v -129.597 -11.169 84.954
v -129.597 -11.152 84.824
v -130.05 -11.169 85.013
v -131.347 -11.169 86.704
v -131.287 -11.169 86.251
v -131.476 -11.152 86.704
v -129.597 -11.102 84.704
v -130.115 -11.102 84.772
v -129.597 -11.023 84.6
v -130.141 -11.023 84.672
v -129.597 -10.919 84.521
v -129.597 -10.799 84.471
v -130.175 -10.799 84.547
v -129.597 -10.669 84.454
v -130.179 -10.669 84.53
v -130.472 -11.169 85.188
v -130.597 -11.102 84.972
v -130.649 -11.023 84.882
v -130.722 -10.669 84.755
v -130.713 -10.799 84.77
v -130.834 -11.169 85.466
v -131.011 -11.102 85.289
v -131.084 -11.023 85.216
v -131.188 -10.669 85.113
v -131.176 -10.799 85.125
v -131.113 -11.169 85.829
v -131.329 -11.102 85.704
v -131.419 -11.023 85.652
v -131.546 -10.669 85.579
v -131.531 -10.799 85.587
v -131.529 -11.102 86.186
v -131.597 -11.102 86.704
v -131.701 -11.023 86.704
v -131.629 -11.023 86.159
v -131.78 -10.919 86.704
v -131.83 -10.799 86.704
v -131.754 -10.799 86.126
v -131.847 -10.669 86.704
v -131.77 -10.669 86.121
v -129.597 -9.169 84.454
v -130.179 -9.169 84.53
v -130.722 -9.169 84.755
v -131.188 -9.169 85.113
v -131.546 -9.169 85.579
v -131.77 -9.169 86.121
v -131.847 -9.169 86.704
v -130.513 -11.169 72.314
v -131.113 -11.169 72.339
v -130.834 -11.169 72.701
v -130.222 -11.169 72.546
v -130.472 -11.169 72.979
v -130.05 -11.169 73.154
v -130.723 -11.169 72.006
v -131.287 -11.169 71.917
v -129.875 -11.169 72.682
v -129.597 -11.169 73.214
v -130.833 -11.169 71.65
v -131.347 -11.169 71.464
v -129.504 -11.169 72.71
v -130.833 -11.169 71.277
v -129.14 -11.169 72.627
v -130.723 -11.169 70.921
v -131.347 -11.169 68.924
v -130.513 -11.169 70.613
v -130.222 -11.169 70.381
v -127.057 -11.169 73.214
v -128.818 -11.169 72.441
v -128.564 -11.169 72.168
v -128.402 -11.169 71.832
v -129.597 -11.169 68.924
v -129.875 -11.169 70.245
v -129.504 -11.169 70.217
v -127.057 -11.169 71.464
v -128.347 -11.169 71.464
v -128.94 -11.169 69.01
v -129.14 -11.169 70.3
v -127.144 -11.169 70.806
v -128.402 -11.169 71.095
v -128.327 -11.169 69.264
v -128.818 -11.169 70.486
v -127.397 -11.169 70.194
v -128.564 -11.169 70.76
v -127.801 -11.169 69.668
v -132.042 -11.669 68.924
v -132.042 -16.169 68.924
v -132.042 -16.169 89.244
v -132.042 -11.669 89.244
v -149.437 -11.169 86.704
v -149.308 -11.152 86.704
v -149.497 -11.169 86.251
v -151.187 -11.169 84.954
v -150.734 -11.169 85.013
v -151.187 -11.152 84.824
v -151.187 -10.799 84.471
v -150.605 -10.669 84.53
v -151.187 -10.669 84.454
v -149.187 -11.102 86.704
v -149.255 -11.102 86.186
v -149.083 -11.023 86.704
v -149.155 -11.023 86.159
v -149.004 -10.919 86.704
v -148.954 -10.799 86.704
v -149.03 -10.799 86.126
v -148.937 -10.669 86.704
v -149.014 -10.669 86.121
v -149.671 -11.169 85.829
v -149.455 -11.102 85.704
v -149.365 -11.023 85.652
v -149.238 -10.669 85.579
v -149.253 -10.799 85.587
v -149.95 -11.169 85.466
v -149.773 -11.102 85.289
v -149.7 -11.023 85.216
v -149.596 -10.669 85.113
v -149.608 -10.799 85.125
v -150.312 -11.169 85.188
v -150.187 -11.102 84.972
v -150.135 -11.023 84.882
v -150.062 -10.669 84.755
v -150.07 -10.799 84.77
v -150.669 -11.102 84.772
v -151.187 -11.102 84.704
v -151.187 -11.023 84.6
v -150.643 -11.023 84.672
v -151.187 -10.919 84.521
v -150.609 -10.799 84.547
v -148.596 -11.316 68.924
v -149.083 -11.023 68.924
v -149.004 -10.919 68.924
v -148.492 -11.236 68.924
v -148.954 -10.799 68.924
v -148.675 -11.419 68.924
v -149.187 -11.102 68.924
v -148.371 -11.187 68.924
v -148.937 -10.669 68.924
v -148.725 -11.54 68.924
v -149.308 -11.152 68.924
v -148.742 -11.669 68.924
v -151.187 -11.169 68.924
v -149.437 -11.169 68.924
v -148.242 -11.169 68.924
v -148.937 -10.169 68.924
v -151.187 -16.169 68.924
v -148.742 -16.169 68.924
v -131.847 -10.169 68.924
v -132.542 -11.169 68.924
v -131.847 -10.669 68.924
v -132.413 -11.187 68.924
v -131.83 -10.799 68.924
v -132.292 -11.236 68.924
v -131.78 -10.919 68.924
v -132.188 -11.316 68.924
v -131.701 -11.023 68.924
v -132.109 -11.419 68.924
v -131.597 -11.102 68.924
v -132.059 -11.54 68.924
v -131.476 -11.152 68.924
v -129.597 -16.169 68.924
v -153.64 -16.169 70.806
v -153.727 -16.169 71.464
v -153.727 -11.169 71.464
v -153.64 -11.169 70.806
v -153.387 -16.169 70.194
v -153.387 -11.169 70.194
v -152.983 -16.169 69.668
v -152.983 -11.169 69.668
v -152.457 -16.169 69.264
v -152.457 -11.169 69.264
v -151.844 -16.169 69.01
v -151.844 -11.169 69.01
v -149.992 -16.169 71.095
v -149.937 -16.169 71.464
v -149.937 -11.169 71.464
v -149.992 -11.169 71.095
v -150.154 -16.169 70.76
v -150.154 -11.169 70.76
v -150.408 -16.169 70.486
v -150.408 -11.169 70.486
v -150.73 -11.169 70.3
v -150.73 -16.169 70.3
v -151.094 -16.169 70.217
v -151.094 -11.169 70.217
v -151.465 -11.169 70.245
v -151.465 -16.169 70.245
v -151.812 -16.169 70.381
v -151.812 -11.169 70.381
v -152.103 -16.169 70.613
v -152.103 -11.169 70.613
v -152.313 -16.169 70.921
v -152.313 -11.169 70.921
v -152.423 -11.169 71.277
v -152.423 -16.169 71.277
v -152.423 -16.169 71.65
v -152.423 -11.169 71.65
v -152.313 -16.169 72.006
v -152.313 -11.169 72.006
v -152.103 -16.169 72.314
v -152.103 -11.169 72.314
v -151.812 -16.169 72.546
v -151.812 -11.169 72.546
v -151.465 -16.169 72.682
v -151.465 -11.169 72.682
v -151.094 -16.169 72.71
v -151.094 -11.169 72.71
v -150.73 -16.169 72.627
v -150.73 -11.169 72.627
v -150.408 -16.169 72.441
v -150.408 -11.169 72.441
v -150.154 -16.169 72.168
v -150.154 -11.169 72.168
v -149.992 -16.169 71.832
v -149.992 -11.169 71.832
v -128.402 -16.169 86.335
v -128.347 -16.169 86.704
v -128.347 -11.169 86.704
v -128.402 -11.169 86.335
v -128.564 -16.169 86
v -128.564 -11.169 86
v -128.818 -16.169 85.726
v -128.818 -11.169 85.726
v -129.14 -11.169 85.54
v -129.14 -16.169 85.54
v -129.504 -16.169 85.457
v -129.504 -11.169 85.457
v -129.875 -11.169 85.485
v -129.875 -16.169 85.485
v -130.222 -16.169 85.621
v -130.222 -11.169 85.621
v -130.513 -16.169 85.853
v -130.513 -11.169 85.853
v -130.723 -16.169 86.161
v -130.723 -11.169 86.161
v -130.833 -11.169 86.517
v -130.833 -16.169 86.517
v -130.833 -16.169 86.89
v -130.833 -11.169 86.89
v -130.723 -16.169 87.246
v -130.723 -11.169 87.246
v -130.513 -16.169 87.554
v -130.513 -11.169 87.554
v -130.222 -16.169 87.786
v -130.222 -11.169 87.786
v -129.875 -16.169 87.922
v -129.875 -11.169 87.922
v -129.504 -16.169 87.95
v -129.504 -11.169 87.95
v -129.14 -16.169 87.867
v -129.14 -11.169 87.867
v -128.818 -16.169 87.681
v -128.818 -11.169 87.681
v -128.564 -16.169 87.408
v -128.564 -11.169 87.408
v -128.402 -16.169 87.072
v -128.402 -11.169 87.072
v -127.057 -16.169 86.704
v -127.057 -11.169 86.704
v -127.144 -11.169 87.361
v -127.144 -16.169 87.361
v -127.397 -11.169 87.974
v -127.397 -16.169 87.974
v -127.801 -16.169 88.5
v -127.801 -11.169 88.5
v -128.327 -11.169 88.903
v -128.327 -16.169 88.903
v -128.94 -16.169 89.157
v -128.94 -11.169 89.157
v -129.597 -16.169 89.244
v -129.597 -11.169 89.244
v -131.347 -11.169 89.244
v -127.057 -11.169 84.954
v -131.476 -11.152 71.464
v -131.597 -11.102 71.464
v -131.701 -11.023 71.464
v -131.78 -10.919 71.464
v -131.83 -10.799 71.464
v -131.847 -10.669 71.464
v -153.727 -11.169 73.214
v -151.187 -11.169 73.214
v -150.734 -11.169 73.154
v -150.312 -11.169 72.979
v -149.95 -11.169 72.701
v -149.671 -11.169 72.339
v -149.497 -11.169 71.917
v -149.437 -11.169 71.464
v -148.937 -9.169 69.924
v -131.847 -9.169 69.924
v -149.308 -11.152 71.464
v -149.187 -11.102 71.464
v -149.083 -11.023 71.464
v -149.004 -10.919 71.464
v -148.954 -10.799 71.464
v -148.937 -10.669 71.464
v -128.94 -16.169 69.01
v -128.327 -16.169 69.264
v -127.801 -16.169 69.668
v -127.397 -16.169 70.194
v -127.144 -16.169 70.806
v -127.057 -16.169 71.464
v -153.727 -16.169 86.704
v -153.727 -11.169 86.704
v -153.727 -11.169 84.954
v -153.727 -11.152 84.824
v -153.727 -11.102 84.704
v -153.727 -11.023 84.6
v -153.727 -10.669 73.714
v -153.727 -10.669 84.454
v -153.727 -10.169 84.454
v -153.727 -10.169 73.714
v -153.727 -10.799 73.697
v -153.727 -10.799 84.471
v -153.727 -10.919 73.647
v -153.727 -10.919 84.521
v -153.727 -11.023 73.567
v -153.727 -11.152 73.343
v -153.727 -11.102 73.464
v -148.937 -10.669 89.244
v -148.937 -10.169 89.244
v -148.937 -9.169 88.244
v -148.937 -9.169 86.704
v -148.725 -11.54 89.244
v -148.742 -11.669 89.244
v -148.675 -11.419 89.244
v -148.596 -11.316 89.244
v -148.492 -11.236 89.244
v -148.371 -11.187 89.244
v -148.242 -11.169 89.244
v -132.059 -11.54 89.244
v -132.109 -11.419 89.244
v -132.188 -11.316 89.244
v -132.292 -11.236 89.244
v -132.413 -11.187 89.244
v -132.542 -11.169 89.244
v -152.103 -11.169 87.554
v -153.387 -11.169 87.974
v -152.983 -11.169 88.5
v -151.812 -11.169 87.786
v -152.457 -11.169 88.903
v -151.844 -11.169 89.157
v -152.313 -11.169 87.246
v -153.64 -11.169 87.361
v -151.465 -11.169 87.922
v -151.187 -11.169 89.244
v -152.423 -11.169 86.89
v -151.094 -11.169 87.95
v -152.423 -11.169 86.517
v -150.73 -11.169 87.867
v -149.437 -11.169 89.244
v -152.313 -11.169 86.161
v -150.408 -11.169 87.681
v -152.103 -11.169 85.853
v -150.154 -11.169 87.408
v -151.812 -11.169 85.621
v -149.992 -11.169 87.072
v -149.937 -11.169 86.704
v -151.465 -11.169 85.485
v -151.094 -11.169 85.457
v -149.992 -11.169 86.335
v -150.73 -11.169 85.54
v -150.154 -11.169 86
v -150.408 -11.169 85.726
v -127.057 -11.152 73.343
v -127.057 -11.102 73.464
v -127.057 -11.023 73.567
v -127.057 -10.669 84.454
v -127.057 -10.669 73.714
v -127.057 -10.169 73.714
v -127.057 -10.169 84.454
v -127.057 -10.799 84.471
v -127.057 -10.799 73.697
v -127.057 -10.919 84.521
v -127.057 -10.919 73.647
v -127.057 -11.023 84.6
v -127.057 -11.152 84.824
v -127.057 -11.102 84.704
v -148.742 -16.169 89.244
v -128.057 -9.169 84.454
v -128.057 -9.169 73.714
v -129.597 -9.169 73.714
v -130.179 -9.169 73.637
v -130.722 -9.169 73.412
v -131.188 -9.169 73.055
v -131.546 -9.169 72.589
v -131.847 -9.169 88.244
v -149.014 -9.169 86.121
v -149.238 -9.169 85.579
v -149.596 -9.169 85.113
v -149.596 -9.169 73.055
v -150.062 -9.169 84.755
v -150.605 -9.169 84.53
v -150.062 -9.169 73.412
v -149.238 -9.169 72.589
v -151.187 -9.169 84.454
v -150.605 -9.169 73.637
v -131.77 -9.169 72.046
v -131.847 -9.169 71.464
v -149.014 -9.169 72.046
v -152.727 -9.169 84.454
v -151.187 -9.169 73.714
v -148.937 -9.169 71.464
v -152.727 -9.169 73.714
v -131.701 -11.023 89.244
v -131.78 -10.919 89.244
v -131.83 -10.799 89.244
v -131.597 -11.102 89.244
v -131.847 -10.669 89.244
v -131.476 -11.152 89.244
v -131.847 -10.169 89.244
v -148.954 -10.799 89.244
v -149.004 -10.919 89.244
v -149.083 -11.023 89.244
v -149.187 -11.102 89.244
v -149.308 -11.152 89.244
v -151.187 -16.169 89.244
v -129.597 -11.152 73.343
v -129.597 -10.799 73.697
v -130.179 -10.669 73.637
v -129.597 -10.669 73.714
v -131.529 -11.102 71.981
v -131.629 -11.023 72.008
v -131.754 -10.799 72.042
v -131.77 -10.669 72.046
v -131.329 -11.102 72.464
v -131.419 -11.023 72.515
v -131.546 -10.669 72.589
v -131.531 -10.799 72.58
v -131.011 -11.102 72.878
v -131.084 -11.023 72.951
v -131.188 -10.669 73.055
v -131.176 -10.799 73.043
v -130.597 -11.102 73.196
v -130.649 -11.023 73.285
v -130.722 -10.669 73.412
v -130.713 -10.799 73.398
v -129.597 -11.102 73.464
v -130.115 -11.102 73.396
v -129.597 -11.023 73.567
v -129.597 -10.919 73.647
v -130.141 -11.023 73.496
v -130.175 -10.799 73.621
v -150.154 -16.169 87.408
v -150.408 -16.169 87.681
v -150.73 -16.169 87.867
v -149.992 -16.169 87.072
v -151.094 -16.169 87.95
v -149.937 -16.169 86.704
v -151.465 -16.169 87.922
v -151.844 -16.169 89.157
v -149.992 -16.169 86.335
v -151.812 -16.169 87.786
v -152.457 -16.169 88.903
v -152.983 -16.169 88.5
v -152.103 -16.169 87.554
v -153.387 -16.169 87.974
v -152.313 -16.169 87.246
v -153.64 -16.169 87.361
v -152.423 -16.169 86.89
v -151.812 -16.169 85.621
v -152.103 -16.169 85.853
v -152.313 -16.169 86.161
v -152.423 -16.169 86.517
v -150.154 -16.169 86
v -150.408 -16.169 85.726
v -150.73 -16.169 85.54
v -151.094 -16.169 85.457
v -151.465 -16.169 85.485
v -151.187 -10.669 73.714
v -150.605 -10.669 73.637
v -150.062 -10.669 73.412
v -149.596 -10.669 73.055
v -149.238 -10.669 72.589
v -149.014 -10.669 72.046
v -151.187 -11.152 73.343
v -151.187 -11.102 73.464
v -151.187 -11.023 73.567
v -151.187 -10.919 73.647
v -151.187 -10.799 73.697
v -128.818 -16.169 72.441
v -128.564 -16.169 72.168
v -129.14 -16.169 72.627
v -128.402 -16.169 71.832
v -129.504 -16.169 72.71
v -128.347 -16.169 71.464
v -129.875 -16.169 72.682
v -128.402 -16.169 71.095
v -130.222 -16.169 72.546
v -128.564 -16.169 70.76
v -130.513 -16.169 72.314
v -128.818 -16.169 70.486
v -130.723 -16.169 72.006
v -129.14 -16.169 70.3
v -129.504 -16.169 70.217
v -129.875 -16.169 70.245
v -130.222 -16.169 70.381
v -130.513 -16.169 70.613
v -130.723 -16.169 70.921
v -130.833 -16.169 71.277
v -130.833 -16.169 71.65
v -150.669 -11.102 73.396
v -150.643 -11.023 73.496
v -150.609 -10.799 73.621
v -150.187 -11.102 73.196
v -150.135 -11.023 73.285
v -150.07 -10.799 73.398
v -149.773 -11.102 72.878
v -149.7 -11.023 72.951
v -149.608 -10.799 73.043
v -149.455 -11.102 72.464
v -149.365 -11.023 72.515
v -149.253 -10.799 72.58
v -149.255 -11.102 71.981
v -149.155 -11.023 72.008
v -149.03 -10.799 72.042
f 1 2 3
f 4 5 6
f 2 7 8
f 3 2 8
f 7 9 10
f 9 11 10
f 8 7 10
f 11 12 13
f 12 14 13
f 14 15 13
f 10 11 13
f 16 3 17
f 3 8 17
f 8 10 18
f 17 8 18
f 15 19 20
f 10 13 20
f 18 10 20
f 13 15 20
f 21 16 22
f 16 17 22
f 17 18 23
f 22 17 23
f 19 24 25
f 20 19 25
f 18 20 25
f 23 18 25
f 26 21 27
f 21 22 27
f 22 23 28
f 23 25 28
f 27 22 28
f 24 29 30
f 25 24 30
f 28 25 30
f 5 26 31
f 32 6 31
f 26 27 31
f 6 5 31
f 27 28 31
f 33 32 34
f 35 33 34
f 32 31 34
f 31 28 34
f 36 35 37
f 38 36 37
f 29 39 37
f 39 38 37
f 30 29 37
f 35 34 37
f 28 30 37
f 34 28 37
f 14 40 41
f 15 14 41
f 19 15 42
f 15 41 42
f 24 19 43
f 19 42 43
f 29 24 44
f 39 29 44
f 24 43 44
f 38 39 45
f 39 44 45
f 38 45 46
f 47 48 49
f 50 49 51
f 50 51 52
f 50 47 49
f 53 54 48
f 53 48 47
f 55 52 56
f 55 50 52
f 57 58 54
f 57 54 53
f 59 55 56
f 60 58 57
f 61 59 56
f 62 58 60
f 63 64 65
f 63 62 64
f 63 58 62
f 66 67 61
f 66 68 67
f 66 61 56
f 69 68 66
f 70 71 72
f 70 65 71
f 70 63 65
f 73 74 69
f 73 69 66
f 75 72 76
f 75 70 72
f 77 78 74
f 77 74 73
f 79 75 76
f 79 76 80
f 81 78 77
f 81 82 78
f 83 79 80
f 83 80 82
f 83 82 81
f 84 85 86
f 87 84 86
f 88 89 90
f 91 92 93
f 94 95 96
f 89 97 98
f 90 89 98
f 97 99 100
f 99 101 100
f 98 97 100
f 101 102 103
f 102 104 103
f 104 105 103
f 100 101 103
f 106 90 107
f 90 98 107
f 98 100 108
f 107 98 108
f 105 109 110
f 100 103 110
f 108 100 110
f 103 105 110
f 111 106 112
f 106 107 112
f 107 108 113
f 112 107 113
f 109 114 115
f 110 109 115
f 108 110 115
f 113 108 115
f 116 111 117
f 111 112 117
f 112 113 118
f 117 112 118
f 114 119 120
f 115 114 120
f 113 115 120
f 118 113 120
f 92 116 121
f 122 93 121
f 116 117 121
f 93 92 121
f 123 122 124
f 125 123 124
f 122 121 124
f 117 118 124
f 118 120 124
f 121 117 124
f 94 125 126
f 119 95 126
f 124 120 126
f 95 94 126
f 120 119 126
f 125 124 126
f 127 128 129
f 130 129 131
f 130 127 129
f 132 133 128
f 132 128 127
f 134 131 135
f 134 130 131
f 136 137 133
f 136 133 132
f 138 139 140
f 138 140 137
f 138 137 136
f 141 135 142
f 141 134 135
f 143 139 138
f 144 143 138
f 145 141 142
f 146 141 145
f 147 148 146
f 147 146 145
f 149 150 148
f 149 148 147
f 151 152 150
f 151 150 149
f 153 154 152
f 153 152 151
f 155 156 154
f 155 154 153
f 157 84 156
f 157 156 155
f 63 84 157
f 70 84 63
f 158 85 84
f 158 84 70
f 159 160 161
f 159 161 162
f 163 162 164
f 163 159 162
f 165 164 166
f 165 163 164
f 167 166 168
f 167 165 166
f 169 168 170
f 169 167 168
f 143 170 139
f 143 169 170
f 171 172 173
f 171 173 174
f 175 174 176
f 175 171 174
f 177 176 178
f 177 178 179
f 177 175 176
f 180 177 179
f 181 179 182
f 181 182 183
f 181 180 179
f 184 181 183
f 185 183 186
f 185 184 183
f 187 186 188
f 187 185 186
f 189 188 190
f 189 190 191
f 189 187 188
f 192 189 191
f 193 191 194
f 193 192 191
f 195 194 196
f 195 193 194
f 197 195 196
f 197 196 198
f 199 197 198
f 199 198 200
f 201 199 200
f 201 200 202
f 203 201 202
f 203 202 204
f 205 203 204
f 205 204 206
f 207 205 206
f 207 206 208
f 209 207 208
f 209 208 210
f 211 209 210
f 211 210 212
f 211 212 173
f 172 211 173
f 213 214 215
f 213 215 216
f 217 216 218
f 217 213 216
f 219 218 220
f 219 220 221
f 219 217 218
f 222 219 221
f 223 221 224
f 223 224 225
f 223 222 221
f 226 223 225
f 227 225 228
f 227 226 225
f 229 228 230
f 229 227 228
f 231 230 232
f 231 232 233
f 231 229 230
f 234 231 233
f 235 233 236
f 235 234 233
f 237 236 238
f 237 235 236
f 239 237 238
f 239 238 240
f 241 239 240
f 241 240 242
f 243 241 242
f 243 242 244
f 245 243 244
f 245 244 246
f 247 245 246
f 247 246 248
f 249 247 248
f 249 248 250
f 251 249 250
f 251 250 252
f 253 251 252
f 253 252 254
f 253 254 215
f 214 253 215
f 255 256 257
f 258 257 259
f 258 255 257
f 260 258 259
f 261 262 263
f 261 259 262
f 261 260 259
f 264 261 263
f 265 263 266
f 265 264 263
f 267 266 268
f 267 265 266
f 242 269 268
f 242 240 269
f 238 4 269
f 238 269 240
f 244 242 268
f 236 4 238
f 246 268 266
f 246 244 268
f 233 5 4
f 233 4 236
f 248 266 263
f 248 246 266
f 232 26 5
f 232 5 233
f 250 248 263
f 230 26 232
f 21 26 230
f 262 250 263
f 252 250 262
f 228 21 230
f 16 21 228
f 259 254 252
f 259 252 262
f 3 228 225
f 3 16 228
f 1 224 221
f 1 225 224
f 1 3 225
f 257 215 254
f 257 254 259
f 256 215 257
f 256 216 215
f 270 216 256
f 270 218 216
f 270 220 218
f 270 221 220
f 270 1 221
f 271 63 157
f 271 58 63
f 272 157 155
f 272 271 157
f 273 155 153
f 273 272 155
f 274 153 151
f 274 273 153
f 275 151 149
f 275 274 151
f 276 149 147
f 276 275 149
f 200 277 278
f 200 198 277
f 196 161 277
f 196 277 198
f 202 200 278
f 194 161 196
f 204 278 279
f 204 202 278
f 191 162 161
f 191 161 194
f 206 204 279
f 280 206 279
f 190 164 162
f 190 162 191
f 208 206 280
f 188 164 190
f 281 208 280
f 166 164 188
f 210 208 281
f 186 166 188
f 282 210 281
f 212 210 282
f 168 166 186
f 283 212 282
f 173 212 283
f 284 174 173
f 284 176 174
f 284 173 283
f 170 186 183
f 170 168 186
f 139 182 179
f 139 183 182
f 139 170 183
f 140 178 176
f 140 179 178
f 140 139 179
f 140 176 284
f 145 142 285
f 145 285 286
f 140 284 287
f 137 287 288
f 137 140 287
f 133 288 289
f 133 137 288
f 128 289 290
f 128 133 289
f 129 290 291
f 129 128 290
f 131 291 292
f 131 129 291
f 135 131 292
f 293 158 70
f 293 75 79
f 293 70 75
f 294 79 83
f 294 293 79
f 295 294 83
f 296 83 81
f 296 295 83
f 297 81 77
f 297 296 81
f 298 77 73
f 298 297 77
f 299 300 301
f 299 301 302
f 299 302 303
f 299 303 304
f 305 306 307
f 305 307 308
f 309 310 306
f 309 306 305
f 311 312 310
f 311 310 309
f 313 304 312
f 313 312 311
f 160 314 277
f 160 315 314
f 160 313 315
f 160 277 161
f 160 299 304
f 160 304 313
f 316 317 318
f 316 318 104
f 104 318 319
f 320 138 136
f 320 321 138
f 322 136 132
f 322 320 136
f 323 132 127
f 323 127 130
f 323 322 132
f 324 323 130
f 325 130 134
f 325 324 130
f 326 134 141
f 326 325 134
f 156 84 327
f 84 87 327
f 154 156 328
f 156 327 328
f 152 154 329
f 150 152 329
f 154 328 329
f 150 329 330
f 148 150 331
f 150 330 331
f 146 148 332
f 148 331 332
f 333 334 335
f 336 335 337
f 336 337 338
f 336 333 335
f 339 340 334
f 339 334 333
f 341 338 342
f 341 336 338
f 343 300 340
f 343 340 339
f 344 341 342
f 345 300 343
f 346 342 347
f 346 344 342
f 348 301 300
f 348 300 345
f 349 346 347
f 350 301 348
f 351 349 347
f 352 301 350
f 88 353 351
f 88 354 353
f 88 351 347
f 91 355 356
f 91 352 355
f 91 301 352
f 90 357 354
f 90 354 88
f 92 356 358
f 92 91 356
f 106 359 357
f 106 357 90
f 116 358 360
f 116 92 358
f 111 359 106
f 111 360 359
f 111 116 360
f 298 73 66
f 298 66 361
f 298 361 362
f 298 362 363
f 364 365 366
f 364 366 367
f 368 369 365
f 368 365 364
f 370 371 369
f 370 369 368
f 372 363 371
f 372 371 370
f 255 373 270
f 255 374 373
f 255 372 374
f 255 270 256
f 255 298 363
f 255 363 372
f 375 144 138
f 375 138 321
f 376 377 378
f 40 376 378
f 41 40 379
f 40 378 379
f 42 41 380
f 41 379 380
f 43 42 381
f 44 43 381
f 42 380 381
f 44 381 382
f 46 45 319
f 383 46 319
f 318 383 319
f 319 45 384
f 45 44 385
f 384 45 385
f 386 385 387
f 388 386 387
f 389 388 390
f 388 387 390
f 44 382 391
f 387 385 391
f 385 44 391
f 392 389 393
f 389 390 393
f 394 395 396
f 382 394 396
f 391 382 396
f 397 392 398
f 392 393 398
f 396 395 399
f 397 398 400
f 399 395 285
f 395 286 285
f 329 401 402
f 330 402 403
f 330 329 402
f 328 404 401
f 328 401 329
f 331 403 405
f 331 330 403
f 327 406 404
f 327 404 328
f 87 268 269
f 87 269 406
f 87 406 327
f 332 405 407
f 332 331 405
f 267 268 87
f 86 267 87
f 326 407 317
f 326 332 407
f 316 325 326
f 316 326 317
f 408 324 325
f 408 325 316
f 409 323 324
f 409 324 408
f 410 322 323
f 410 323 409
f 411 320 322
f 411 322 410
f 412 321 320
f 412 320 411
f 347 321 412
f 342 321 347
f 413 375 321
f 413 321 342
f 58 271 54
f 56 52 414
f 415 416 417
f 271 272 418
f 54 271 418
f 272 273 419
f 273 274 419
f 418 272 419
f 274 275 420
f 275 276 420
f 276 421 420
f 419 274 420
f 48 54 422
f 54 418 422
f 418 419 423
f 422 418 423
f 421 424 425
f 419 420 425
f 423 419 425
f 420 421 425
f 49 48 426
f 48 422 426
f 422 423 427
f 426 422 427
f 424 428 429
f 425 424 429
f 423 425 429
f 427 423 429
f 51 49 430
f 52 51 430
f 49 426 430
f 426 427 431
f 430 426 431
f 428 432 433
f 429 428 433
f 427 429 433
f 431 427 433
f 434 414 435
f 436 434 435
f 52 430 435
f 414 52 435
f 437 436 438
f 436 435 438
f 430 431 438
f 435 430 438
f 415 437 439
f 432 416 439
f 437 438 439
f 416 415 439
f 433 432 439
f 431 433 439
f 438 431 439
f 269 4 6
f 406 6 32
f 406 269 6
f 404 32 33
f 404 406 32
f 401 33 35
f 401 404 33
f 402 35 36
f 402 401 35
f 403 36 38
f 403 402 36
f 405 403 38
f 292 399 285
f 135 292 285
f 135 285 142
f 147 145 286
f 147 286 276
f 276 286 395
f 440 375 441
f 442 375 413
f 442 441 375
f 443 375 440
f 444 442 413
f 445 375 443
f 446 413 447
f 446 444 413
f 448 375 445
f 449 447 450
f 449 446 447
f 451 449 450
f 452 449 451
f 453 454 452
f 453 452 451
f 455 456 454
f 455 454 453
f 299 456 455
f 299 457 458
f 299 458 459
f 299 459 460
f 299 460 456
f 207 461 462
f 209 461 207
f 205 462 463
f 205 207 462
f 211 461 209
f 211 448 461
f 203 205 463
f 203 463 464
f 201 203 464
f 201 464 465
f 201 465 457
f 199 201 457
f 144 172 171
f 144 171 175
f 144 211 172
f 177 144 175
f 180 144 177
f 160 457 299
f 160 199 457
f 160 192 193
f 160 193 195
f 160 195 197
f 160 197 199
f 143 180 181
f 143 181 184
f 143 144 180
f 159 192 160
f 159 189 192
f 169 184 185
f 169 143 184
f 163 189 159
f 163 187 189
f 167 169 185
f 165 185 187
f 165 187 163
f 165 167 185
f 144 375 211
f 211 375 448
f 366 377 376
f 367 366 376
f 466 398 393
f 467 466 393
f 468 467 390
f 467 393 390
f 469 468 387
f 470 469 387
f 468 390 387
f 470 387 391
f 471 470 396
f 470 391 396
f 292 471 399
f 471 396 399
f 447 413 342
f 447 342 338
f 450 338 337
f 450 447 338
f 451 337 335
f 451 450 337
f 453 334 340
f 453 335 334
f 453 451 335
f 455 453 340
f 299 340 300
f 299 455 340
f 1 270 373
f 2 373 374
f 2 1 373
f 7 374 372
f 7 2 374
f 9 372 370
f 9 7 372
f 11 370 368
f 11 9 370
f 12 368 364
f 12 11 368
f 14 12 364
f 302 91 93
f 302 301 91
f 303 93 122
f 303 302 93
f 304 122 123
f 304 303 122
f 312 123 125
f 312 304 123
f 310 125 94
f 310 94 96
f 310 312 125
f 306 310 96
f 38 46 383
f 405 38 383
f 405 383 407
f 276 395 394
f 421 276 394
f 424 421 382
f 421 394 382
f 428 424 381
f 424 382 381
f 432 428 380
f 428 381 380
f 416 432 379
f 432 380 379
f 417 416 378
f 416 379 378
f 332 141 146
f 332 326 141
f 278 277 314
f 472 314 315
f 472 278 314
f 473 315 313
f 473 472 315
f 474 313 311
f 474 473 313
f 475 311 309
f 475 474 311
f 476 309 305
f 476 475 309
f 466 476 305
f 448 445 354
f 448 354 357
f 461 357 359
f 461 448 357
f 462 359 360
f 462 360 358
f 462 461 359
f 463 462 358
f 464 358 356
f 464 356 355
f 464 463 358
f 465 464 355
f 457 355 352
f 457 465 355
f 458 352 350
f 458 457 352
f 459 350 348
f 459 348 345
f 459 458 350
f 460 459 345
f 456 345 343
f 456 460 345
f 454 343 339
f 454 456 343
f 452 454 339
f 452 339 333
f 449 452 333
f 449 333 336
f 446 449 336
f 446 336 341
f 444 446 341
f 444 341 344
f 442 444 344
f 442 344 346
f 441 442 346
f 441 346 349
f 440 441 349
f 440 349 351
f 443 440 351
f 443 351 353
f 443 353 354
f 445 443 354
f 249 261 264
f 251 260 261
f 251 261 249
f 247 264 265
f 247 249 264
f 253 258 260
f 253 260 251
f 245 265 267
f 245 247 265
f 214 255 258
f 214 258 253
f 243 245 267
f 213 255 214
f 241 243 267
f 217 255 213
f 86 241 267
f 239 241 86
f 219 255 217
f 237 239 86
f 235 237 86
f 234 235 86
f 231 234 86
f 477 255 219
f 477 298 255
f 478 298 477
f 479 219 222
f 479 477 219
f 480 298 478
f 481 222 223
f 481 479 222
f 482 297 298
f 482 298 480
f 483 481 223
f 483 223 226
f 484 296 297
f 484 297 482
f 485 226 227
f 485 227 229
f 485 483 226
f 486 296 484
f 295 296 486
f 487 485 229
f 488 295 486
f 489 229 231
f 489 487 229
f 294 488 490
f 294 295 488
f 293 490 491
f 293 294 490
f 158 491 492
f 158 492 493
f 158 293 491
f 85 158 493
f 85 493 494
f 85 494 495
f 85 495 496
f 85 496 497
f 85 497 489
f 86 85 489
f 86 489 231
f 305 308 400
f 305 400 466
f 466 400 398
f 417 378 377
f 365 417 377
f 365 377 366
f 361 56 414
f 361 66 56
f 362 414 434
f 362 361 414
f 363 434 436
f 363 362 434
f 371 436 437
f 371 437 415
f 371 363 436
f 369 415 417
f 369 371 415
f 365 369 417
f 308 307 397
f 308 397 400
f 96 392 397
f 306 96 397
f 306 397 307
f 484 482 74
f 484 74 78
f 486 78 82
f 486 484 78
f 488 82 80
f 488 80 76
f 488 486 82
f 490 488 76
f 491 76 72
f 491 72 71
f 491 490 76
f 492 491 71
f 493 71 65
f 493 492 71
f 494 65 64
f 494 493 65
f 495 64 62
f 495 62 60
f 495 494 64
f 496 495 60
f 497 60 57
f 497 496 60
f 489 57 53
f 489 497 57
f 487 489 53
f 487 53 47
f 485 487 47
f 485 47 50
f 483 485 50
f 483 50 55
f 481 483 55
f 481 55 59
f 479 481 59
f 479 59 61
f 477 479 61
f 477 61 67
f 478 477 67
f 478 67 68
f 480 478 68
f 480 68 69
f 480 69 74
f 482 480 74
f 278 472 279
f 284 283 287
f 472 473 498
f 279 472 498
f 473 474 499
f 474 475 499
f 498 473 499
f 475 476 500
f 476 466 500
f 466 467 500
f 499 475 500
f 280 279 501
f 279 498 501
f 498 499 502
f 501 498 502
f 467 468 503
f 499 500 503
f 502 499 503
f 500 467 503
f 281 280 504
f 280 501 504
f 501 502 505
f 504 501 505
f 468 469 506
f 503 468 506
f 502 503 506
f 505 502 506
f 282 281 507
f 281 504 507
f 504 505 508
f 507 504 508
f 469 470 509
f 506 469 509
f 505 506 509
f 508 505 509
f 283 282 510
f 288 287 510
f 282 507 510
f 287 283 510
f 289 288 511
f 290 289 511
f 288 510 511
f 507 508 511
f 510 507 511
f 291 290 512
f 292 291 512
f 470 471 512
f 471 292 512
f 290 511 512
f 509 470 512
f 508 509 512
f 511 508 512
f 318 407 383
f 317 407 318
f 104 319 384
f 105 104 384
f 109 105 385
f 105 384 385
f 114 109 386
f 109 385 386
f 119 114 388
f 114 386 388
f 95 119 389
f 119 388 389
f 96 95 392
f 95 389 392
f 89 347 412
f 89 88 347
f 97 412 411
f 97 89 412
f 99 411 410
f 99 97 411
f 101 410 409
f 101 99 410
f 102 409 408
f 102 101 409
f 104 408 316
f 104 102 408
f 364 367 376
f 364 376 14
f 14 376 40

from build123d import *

# Parameters (mm, degrees)
SKETCH1_R           = 1.25
BOSS_EXTRUDE1_DEPTH = 7
SKETCH2_W           = 16.7
SKETCH2_H           = 20.32
CUT_EXTRUDE1_DEPTH  = 5
SKETCH3_R           = 1.25
CUT_EXTRUDE2_DEPTH  = 2
CHAMFER1_SIZE       = 1
FILLET1_R           = 0.5
FILLET2_R           = 0.5


with BuildPart() as part:
    # Sketch1 → Boss-Extrude1 (new body)
    with BuildSketch(Plane(origin=(0, -16.169464744, 0), x_dir=(1, 0, 0), z_dir=(0, 1, 0))):
        with BuildLine():
            Line((-127.05696299, -71.463712198), (-127.05696299, -86.703712198))
            ThreePointArc((-127.05696299, -86.703712198), (-127.800911766, -88.499763423), (-129.59696299, -89.243712198))
            Line((-129.59696299, -89.243712198), (-151.18696299, -89.243712198))
            ThreePointArc((-151.18696299, -89.243712198), (-152.983014214, -88.499763423), (-153.72696299, -86.703712198))
            Line((-153.72696299, -86.703712198), (-153.72696299, -71.463712198))
            ThreePointArc((-153.72696299, -71.463712198), (-152.983014214, -69.667660974), (-151.18696299, -68.923712198))
            Line((-151.18696299, -68.923712198), (-129.59696299, -68.923712198))
            ThreePointArc((-129.59696299, -68.923712198), (-127.800911766, -69.667660974), (-127.05696299, -71.463712198))
        make_face()
        with Locations((-151.18696299, -71.463712198)):
            Circle(SKETCH1_R, mode=Mode.SUBTRACT)
        with Locations((-151.18696299, -86.703712198)):
            Circle(SKETCH1_R, mode=Mode.SUBTRACT)
        with Locations((-129.59696299, -86.703712198)):
            Circle(SKETCH1_R, mode=Mode.SUBTRACT)
        with Locations((-129.59696299, -71.463712198)):
            Circle(SKETCH1_R, mode=Mode.SUBTRACT)
    extrude(amount=BOSS_EXTRUDE1_DEPTH)

    # Sketch2 → Cut-Extrude1 (cut)
    with BuildSketch(Plane.XZ.offset(16.169464744)):
        with Locations((-140.39196299, 79.083712198)):
            Rectangle(SKETCH2_W, SKETCH2_H)
    extrude(amount=-CUT_EXTRUDE1_DEPTH, mode=Mode.SUBTRACT)

    # Sketch3 → Cut-Extrude2 (cut)
    with BuildSketch(Plane(origin=(0, -9.169464744, 0), x_dir=(1, 0, 0), z_dir=(0, 1, 0))):
        with BuildLine():
            Line((-131.84696299, -86.703712198), (-131.84696299, -89.243712198))
            Line((-131.84696299, -89.243712198), (-129.59696299, -89.243712198))
            ThreePointArc((-129.59696299, -89.243712198), (-127.800911766, -88.499763423), (-127.05696299, -86.703712198))
            Line((-127.05696299, -86.703712198), (-127.05696299, -84.453712198))
            Line((-127.05696299, -84.453712198), (-129.59696299, -84.453712198))
            ThreePointArc((-129.59696299, -84.453712198), (-131.187953248, -85.112721941), (-131.84696299, -86.703712198))
        make_face()
        with Locations((-129.59696299, -86.703712198)):
            Circle(SKETCH3_R, mode=Mode.SUBTRACT)
        with BuildLine():
            Line((-151.18696299, -89.243712198), (-148.93696299, -89.243712198))
            Line((-148.93696299, -89.243712198), (-148.93696299, -86.703712198))
            ThreePointArc((-148.93696299, -86.703712198), (-149.595972732, -85.112721941), (-151.18696299, -84.453712198))
            Line((-151.18696299, -84.453712198), (-153.72696299, -84.453712198))
            Line((-153.72696299, -84.453712198), (-153.72696299, -86.703712198))
            ThreePointArc((-153.72696299, -86.703712198), (-152.983014214, -88.499763423), (-151.18696299, -89.243712198))
        make_face()
        with Locations((-151.18696299, -86.703712198)):
            Circle(SKETCH3_R, mode=Mode.SUBTRACT)
        with BuildLine():
            Line((-153.72696299, -71.463712198), (-153.72696299, -73.713712198))
            Line((-153.72696299, -73.713712198), (-151.18696299, -73.713712198))
            ThreePointArc((-151.18696299, -73.713712198), (-149.595972732, -73.054702456), (-148.93696299, -71.463712198))
            Line((-148.93696299, -71.463712198), (-148.93696299, -68.923712198))
            Line((-148.93696299, -68.923712198), (-151.18696299, -68.923712198))
            ThreePointArc((-151.18696299, -68.923712198), (-152.983014214, -69.667660974), (-153.72696299, -71.463712198))
        make_face()
        with Locations((-151.18696299, -71.463712198)):
            Circle(SKETCH3_R, mode=Mode.SUBTRACT)
        with BuildLine():
            Line((-129.59696299, -73.713712198), (-127.05696299, -73.713712198))
            Line((-127.05696299, -73.713712198), (-127.05696299, -71.463712198))
            ThreePointArc((-127.05696299, -71.463712198), (-127.800911766, -69.667660974), (-129.59696299, -68.923712198))
            Line((-129.59696299, -68.923712198), (-131.84696299, -68.923712198))
            Line((-131.84696299, -68.923712198), (-131.84696299, -71.463712198))
            ThreePointArc((-131.84696299, -71.463712198), (-131.187953248, -73.054702456), (-129.59696299, -73.713712198))
        make_face()
        with Locations((-129.59696299, -71.463712198)):
            Circle(SKETCH3_R, mode=Mode.SUBTRACT)
    extrude(amount=-CUT_EXTRUDE2_DEPTH, mode=Mode.SUBTRACT)

    # Chamfer1
    chamfer1_edges = [part.edges().sort_by_distance(p)[0] for p in [
        (-127.05696299, -9.169464744, 79.083712198),
        (-153.72696299, -9.169464744, 79.083712198),
        (-140.39196299, -9.169464744, 68.923712198),
        (-140.39196299, -9.169464744, 89.243712198),
    ]]
    chamfer(chamfer1_edges, length=CHAMFER1_SIZE)

    # Fillet1
    fillet1_edges = [part.edges().sort_by_distance(p)[0] for p in [
        (-148.74196299, -11.169464744, 79.083712198),
        (-132.04196299, -11.169464744, 79.083712198),
    ]]
    fillet(fillet1_edges, radius=FILLET1_R)

    # Fillet2
    fillet2_edges = [part.edges().sort_by_distance(p)[0] for p in [
        (-148.93696299, -11.169464744, 87.973712198),
        (-152.45696299, -11.169464744, 84.453712198),
        (-149.595972732, -11.169464744, 85.112721941),
        (-131.187953248, -11.169464744, 85.112721941),
        (-128.32696299, -11.169464744, 84.453712198),
        (-131.84696299, -11.169464744, 87.973712198),
        (-131.84696299, -11.169464744, 70.193712198),
        (-128.32696299, -11.169464744, 73.713712198),
        (-131.187953248, -11.169464744, 73.054702456),
        (-149.595972732, -11.169464744, 73.054702456),
        (-152.45696299, -11.169464744, 73.713712198),
        (-148.93696299, -11.169464744, 70.193712198),
    ]]
    fillet(fillet2_edges, radius=FILLET2_R)


solid = part.part
